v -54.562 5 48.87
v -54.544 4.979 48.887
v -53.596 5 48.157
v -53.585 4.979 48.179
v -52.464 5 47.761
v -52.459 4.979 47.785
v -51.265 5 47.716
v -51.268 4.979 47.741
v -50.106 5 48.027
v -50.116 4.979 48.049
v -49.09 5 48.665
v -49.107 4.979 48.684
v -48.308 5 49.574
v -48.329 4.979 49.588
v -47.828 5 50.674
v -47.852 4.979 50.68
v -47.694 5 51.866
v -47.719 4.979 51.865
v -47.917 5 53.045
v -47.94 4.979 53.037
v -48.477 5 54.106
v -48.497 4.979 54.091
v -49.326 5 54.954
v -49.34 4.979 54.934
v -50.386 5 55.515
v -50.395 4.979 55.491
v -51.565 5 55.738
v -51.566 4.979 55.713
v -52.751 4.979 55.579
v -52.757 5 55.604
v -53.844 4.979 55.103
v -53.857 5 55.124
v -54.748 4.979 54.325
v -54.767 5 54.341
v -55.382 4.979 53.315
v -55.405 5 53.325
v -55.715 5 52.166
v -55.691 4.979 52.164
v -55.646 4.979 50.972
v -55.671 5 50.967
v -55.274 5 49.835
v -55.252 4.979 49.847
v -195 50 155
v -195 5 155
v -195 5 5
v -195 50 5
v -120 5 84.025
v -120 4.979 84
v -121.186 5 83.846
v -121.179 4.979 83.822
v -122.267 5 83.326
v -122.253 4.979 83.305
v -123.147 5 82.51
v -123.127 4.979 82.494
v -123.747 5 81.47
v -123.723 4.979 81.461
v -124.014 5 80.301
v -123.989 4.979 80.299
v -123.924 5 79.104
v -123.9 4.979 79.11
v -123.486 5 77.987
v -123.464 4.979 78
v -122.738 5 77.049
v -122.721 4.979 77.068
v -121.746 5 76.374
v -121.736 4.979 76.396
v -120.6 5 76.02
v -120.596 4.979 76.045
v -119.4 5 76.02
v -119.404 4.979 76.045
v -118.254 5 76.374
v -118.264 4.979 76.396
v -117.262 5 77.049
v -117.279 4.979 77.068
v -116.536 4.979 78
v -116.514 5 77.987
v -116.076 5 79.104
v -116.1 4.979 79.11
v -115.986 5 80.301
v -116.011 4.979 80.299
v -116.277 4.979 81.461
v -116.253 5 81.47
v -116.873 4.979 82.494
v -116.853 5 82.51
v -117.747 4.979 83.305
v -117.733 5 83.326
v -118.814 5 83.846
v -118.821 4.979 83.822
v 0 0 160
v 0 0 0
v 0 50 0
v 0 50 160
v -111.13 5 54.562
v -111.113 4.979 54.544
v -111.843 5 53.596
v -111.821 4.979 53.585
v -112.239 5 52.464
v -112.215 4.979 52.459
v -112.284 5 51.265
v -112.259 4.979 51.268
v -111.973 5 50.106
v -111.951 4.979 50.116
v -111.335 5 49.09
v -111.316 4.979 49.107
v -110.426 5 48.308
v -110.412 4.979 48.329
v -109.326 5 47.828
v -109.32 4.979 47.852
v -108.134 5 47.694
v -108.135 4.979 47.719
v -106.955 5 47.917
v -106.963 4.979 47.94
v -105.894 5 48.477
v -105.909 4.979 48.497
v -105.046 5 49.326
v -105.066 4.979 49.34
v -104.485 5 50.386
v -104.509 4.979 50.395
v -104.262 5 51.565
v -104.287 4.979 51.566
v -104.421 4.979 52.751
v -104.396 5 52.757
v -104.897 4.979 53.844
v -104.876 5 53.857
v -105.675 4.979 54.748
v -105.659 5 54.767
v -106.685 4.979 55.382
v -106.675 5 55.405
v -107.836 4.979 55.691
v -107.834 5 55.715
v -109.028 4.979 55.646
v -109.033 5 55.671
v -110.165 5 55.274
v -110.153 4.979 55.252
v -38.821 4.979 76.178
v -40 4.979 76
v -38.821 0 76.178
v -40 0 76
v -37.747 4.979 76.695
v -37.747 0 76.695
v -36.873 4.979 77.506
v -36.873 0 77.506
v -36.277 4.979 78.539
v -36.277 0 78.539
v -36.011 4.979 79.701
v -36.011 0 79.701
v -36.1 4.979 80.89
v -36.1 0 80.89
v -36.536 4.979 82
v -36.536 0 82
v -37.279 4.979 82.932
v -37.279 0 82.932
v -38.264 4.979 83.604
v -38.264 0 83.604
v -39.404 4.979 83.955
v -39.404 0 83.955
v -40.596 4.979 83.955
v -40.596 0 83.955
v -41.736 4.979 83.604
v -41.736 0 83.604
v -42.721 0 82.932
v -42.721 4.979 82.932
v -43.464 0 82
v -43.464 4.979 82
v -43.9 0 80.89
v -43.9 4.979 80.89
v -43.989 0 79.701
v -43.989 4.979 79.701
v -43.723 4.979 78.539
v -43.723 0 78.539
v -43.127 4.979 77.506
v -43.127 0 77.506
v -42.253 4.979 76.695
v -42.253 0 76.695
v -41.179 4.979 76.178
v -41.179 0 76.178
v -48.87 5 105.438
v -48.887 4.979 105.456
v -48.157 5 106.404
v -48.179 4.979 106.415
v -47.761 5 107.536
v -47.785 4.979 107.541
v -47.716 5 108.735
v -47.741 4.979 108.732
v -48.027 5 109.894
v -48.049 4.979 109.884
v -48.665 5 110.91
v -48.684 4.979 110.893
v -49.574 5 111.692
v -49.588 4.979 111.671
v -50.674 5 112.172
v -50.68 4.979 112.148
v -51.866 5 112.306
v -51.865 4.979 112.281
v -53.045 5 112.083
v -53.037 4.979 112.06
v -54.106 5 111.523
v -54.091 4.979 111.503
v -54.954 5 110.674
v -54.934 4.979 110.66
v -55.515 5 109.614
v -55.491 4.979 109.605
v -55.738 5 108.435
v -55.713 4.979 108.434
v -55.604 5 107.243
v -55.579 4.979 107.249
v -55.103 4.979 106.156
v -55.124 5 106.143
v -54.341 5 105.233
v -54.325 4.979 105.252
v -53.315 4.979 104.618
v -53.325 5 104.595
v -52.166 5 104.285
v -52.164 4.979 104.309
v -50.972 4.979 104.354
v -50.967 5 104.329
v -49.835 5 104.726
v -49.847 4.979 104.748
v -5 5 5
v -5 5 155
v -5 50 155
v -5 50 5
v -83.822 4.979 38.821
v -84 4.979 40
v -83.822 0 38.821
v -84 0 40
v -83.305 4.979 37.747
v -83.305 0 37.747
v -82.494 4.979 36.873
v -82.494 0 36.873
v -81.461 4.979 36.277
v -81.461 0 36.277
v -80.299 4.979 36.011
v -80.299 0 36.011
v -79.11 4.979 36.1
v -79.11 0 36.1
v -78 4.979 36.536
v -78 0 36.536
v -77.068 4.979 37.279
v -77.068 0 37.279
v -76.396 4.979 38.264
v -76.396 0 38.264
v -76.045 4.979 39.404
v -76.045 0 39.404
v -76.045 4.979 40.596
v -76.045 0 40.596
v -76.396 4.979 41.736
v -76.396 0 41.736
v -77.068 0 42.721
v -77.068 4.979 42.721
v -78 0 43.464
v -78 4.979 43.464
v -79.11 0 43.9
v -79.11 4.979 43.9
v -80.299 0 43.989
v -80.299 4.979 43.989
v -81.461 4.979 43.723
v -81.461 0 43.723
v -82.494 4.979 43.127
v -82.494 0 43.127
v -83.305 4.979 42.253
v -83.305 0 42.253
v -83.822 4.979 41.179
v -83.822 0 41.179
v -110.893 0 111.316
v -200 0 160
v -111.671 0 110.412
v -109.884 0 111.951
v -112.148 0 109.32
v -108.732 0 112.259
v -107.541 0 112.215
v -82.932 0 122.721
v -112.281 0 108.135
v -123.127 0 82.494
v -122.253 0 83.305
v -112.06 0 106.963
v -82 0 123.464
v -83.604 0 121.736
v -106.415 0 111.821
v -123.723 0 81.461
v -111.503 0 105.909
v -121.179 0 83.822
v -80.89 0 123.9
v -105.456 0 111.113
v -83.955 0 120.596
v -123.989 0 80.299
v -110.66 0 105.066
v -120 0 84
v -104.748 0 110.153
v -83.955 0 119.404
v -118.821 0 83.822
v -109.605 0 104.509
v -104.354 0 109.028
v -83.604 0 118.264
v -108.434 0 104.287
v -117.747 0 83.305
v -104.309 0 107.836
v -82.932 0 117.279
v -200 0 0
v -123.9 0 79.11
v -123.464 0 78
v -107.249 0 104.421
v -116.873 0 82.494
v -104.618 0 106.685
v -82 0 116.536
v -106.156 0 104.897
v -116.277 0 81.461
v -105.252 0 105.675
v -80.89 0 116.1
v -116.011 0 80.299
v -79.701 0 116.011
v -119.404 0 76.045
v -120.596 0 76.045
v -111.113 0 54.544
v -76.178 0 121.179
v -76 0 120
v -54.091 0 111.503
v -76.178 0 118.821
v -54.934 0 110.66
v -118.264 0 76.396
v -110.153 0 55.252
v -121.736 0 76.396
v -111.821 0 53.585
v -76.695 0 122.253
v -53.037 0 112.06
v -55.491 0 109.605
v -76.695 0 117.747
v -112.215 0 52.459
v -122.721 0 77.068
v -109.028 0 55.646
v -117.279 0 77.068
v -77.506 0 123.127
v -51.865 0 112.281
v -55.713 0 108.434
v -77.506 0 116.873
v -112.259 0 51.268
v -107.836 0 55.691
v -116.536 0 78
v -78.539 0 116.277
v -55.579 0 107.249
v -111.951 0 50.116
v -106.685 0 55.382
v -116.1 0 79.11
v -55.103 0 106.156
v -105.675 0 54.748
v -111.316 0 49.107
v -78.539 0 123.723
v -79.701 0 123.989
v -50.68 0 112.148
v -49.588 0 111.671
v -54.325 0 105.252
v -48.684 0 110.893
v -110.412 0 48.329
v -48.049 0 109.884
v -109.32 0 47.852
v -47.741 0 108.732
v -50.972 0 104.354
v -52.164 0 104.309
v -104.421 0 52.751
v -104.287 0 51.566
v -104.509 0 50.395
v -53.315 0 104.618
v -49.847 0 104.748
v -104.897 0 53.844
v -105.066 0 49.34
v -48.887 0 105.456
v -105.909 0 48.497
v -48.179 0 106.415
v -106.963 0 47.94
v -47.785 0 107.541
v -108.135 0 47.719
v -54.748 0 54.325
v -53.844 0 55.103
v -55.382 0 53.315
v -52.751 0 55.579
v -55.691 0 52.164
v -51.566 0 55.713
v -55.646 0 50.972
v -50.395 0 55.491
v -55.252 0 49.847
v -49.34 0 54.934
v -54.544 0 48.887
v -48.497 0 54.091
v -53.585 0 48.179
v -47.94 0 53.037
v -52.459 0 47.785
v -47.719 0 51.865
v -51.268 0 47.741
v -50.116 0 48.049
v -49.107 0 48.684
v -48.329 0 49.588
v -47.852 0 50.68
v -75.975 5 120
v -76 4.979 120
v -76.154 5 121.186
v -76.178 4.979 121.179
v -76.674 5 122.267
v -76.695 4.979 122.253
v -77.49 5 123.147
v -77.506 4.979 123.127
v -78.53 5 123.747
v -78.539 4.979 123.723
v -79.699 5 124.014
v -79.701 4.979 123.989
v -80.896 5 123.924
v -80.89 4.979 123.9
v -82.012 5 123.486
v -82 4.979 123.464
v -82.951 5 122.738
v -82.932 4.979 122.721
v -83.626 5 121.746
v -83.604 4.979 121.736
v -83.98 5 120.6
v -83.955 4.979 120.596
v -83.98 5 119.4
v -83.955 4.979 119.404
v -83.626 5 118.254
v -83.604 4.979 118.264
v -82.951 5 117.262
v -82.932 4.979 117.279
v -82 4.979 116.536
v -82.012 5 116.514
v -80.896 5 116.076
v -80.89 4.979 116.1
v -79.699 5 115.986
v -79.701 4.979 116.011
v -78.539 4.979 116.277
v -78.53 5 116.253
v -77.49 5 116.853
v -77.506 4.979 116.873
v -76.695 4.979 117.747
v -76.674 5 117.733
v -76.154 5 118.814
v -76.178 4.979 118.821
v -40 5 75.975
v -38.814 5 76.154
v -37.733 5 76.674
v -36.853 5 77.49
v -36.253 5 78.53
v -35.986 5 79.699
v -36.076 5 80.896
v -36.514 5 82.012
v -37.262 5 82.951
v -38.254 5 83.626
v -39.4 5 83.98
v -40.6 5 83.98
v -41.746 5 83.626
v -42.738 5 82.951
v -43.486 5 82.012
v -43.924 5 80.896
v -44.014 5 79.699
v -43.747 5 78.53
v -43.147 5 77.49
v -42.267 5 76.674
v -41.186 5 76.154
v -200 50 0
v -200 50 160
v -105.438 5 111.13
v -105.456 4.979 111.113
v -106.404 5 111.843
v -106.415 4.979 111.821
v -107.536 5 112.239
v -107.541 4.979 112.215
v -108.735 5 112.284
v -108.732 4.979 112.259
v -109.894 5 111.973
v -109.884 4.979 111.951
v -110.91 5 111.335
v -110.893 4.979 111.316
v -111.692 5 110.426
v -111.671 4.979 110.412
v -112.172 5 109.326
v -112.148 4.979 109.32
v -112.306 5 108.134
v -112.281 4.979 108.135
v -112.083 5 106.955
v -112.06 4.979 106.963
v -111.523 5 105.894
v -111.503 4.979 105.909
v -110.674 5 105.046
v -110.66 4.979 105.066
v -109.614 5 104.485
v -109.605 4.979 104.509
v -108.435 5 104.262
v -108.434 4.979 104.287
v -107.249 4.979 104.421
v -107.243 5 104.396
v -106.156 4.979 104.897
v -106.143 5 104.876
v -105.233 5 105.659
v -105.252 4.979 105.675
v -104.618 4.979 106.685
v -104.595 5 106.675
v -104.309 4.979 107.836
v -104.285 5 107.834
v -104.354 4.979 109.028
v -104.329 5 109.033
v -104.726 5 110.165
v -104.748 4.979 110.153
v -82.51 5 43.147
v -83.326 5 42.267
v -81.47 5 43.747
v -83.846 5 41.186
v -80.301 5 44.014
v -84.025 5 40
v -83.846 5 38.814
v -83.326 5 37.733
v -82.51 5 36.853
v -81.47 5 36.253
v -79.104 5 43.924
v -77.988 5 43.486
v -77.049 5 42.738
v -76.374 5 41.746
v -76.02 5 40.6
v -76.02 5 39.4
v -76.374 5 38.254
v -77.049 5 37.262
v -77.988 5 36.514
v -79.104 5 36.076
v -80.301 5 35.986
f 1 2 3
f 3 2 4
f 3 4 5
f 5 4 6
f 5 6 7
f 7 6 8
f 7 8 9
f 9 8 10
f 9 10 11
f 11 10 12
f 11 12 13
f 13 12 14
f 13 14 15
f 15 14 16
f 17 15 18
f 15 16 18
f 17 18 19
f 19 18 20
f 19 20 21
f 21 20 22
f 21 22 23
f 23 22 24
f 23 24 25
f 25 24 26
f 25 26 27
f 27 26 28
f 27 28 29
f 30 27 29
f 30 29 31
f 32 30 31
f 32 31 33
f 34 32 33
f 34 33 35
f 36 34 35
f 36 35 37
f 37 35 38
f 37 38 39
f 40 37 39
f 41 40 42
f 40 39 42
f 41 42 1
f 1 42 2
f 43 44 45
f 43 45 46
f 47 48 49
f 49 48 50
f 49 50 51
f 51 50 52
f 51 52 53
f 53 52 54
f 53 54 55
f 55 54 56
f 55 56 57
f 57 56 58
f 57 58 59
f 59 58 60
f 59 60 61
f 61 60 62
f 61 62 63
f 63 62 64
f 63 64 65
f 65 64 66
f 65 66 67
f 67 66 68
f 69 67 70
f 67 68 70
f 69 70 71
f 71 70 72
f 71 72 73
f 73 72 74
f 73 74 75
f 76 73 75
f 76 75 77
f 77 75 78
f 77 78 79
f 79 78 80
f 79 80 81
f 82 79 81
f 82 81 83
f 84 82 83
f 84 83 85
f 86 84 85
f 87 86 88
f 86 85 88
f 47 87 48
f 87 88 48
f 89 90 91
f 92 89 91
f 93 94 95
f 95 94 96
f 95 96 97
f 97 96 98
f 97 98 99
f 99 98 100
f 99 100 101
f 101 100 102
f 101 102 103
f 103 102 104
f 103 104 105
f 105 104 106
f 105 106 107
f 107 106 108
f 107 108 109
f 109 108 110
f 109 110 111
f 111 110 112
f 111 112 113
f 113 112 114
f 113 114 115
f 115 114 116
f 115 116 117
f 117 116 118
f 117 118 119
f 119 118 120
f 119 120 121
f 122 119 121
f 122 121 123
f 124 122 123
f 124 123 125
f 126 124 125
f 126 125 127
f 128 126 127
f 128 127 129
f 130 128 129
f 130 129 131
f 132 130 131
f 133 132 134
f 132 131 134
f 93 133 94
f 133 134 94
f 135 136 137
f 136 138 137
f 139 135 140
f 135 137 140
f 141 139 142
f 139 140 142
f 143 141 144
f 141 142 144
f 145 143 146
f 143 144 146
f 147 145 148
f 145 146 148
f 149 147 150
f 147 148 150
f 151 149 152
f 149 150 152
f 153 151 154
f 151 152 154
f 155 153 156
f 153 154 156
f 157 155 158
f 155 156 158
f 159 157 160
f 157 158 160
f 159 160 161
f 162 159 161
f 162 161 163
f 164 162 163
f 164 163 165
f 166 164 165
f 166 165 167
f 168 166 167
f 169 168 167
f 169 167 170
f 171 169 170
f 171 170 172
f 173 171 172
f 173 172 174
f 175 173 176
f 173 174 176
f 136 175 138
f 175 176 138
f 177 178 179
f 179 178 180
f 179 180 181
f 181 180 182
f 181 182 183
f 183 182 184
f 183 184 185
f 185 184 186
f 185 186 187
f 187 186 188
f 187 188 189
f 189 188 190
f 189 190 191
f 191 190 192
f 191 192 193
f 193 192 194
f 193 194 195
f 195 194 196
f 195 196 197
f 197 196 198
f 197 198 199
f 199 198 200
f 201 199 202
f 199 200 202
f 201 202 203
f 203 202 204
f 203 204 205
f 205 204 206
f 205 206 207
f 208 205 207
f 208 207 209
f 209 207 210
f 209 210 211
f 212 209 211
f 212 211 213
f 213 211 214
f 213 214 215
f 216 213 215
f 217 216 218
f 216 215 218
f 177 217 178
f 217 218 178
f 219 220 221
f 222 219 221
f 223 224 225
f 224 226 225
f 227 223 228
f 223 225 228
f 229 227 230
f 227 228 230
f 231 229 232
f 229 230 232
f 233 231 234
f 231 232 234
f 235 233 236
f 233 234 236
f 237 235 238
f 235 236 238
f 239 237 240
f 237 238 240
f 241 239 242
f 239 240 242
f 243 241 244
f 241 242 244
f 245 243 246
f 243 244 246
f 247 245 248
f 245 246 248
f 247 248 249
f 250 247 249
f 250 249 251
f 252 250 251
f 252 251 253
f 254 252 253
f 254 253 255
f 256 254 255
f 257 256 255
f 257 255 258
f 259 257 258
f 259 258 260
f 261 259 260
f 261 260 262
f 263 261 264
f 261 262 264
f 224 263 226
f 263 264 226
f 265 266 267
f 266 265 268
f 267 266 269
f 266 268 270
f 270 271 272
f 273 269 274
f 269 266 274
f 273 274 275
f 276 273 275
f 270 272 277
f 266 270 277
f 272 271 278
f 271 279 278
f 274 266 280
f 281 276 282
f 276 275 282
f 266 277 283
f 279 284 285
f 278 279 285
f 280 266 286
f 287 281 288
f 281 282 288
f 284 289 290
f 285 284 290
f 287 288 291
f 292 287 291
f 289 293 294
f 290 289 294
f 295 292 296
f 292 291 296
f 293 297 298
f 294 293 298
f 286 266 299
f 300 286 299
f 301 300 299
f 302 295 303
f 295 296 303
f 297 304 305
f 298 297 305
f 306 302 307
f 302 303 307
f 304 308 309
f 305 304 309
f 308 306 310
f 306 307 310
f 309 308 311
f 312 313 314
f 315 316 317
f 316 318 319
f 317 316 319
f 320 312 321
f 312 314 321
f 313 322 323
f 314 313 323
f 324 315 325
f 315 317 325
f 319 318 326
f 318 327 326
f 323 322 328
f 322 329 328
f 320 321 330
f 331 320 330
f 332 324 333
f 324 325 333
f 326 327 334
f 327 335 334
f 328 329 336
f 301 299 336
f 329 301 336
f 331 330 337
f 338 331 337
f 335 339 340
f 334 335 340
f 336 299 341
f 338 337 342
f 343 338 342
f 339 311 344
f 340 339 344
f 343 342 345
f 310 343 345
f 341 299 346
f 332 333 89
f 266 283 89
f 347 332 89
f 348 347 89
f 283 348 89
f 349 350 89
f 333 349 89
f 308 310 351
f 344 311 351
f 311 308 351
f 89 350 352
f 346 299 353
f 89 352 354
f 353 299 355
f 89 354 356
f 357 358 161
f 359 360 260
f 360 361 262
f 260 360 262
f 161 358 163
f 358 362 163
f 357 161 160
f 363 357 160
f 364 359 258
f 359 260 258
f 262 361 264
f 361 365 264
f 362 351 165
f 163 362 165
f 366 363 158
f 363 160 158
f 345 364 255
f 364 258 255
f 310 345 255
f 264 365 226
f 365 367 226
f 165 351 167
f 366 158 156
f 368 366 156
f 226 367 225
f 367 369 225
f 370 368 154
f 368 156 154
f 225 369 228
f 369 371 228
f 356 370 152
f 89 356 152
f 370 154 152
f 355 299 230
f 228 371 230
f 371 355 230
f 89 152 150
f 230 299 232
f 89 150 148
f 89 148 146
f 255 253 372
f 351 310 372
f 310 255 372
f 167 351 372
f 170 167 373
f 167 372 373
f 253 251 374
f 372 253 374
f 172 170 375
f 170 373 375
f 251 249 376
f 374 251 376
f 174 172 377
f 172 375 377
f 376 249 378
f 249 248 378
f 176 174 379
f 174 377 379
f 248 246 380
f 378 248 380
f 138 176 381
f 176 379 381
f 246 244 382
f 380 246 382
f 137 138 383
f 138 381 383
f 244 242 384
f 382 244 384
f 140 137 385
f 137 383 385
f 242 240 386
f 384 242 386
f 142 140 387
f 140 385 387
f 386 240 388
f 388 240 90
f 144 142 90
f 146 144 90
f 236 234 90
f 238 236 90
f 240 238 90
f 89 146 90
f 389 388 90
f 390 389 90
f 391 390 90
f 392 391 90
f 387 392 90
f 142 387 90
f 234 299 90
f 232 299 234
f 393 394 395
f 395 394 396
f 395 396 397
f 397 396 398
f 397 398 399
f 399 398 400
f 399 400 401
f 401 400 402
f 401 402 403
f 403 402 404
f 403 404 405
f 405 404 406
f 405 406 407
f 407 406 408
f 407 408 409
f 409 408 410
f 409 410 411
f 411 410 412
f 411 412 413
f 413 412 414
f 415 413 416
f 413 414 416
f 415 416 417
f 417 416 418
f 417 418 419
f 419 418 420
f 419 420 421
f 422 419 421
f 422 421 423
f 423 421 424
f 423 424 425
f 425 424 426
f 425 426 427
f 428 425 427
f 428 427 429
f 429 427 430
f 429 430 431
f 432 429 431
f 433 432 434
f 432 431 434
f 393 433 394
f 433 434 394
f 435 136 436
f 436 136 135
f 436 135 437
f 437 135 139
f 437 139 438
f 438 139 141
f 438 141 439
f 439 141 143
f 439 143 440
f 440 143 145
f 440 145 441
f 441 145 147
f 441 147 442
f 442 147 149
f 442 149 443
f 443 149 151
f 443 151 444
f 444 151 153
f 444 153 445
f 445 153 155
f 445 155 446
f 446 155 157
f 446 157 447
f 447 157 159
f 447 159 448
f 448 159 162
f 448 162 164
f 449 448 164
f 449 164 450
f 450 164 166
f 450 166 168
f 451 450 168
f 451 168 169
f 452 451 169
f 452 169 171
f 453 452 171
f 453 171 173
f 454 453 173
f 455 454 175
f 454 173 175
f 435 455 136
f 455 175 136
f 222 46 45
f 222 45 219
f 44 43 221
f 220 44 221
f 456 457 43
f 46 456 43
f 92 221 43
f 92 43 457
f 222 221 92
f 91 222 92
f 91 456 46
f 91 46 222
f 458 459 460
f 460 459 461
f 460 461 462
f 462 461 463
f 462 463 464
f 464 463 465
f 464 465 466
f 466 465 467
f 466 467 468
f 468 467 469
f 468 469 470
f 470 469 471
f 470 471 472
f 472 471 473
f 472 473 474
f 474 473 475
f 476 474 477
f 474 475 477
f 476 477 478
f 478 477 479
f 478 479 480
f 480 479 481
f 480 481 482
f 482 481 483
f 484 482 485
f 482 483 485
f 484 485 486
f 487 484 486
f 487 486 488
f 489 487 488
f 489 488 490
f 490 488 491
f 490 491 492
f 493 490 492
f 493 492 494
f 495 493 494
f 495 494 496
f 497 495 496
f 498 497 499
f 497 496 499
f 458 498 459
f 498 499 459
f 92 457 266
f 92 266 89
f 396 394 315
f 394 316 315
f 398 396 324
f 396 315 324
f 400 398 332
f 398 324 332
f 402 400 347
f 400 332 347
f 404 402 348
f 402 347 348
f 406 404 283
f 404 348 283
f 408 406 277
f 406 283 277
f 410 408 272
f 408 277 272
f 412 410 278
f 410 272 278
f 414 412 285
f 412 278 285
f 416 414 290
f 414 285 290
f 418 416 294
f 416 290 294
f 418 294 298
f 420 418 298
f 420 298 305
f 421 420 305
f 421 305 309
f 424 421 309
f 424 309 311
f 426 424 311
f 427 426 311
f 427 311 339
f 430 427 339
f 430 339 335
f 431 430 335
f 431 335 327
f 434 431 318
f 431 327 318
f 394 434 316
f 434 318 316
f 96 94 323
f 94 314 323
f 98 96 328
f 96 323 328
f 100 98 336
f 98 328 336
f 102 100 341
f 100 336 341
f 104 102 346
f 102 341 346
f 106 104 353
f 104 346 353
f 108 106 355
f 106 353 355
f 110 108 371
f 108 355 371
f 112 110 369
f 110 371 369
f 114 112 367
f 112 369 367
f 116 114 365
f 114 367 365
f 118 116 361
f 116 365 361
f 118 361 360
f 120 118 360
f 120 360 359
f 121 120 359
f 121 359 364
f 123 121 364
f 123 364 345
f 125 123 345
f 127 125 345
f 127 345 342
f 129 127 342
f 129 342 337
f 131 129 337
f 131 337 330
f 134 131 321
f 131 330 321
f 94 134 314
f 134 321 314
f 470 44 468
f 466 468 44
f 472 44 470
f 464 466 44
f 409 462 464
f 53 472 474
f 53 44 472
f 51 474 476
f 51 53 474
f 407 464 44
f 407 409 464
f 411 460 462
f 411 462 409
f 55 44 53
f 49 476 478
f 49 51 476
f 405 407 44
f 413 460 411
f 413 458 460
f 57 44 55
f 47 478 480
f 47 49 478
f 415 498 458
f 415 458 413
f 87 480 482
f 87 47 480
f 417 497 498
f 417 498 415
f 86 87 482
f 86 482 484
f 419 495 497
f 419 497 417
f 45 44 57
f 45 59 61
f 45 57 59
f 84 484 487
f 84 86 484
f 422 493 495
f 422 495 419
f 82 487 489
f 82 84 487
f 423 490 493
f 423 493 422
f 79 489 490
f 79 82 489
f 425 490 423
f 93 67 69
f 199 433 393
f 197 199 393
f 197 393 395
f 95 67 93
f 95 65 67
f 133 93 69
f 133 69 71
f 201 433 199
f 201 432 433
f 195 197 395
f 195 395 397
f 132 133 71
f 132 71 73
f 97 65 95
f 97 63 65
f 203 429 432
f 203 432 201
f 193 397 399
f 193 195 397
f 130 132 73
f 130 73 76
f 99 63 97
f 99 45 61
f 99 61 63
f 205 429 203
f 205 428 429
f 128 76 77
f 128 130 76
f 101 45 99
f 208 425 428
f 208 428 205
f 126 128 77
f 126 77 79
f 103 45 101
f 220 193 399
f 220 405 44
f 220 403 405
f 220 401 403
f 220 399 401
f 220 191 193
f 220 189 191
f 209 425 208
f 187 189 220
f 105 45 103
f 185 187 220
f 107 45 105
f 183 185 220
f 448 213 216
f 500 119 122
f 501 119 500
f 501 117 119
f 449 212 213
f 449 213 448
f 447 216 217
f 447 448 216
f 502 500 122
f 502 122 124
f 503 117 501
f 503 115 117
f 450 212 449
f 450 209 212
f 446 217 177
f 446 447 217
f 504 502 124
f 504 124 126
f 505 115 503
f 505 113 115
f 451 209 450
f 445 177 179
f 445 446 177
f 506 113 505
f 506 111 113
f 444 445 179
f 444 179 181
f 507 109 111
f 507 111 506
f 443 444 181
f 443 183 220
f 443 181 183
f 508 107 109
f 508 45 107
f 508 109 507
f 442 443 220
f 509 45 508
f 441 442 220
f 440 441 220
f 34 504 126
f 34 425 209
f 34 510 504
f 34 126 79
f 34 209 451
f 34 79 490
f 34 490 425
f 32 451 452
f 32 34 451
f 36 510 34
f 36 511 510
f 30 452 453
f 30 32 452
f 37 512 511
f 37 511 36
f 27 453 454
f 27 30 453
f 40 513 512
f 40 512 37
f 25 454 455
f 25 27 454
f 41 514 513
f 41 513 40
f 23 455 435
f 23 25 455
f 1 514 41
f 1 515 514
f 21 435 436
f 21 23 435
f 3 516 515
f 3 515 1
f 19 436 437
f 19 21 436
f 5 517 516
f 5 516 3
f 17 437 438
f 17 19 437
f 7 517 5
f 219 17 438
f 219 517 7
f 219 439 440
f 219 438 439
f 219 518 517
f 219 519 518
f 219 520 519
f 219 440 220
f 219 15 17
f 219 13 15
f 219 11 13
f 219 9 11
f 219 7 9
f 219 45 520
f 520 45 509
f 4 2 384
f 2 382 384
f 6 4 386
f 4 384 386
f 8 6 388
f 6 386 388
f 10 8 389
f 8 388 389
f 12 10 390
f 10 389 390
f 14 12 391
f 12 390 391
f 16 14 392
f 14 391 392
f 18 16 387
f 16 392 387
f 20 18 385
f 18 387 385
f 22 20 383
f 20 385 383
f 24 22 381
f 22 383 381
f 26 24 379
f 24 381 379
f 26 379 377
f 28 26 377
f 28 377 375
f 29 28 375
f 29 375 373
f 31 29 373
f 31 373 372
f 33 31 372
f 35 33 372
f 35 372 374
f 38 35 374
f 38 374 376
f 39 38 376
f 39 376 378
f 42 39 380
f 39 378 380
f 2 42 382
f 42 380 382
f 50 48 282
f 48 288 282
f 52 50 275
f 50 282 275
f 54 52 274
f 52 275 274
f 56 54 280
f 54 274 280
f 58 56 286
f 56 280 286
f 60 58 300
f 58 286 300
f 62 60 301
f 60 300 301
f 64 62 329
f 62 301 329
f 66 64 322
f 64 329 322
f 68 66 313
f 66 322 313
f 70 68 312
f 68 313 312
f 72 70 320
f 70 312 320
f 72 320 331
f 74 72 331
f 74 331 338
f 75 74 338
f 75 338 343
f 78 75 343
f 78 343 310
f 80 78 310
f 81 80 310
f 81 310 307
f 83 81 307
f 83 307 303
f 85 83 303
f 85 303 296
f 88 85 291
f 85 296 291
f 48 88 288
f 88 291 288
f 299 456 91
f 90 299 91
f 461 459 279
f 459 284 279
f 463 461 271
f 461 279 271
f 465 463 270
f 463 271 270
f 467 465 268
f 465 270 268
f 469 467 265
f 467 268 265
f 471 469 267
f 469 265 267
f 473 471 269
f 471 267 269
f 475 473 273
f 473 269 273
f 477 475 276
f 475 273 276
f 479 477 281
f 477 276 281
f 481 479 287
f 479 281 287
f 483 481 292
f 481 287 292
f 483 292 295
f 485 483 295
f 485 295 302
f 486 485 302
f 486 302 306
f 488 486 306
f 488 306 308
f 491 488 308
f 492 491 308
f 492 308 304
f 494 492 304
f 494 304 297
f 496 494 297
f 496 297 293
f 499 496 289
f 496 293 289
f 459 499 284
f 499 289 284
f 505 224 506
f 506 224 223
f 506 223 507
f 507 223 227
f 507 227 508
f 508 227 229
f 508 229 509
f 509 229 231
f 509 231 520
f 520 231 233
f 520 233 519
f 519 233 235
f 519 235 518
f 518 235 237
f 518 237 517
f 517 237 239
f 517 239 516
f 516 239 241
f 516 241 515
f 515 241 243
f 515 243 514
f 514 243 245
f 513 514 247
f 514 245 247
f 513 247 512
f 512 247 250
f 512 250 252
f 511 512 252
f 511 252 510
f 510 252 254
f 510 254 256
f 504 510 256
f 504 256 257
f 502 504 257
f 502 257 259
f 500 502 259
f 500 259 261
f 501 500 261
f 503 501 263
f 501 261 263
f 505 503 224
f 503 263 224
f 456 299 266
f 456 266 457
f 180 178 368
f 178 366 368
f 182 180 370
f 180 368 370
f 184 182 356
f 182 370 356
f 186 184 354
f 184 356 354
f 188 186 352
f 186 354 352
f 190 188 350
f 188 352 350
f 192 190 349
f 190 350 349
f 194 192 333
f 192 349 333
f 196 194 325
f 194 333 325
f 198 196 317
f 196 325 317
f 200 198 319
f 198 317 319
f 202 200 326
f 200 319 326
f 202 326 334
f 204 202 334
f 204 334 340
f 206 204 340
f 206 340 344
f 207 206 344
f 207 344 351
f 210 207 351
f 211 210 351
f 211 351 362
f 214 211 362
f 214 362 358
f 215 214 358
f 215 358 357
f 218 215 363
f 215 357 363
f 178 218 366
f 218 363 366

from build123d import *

# Parameters (mm, degrees)
SKETCH_2_W               = 200
SKETCH_2_H               = 50
EXTRUDE_1_DEPTH          = 160
SHELL_1_T                = -5
M8X1_0_1_D               = 8
M8X1_0_1_CSINK_D         = 8.05
M8X1_0_1_CSINK_ANGLE     = 100
PATTERN_CIRCULAR_1_COUNT = 8


with BuildPart() as part:
    # 草图2 → 凸台-拉伸1 (new body)
    with BuildSketch(Plane.XY):
        with Locations((-100, 25)):
            Rectangle(SKETCH_2_W, SKETCH_2_H)
    extrude(amount=EXTRUDE_1_DEPTH)

    # 抽壳1
    shell_1_openings = [part.faces().sort_by_distance(p)[0] for p in [
        (-100, 50, 80),
    ]]
    offset(amount=SHELL_1_T, openings=shell_1_openings, kind=Kind.INTERSECTION)

    # M8x1.0 螺纹孔1 (through all)
    with Locations(Plane(origin=(0, 5, 0), x_dir=(1, 0, 0), z_dir=(0, 1, 0))):
        with Locations((-80, -40)):
            m8x1_0_1 = CounterSinkHole(M8X1_0_1_D / 2, M8X1_0_1_CSINK_D / 2, counter_sink_angle=M8X1_0_1_CSINK_ANGLE)

    # 阵列(圆周)1: M8x1.0 螺纹孔1 ×8 about axis
    pattern_circular_1_axis = Axis((-80, 0, 80), (0, 1, 0))
    for i in range(1, PATTERN_CIRCULAR_1_COUNT):
        add(m8x1_0_1.rotate(pattern_circular_1_axis, i * 360 / PATTERN_CIRCULAR_1_COUNT), mode=Mode.SUBTRACT)


solid = part.part
